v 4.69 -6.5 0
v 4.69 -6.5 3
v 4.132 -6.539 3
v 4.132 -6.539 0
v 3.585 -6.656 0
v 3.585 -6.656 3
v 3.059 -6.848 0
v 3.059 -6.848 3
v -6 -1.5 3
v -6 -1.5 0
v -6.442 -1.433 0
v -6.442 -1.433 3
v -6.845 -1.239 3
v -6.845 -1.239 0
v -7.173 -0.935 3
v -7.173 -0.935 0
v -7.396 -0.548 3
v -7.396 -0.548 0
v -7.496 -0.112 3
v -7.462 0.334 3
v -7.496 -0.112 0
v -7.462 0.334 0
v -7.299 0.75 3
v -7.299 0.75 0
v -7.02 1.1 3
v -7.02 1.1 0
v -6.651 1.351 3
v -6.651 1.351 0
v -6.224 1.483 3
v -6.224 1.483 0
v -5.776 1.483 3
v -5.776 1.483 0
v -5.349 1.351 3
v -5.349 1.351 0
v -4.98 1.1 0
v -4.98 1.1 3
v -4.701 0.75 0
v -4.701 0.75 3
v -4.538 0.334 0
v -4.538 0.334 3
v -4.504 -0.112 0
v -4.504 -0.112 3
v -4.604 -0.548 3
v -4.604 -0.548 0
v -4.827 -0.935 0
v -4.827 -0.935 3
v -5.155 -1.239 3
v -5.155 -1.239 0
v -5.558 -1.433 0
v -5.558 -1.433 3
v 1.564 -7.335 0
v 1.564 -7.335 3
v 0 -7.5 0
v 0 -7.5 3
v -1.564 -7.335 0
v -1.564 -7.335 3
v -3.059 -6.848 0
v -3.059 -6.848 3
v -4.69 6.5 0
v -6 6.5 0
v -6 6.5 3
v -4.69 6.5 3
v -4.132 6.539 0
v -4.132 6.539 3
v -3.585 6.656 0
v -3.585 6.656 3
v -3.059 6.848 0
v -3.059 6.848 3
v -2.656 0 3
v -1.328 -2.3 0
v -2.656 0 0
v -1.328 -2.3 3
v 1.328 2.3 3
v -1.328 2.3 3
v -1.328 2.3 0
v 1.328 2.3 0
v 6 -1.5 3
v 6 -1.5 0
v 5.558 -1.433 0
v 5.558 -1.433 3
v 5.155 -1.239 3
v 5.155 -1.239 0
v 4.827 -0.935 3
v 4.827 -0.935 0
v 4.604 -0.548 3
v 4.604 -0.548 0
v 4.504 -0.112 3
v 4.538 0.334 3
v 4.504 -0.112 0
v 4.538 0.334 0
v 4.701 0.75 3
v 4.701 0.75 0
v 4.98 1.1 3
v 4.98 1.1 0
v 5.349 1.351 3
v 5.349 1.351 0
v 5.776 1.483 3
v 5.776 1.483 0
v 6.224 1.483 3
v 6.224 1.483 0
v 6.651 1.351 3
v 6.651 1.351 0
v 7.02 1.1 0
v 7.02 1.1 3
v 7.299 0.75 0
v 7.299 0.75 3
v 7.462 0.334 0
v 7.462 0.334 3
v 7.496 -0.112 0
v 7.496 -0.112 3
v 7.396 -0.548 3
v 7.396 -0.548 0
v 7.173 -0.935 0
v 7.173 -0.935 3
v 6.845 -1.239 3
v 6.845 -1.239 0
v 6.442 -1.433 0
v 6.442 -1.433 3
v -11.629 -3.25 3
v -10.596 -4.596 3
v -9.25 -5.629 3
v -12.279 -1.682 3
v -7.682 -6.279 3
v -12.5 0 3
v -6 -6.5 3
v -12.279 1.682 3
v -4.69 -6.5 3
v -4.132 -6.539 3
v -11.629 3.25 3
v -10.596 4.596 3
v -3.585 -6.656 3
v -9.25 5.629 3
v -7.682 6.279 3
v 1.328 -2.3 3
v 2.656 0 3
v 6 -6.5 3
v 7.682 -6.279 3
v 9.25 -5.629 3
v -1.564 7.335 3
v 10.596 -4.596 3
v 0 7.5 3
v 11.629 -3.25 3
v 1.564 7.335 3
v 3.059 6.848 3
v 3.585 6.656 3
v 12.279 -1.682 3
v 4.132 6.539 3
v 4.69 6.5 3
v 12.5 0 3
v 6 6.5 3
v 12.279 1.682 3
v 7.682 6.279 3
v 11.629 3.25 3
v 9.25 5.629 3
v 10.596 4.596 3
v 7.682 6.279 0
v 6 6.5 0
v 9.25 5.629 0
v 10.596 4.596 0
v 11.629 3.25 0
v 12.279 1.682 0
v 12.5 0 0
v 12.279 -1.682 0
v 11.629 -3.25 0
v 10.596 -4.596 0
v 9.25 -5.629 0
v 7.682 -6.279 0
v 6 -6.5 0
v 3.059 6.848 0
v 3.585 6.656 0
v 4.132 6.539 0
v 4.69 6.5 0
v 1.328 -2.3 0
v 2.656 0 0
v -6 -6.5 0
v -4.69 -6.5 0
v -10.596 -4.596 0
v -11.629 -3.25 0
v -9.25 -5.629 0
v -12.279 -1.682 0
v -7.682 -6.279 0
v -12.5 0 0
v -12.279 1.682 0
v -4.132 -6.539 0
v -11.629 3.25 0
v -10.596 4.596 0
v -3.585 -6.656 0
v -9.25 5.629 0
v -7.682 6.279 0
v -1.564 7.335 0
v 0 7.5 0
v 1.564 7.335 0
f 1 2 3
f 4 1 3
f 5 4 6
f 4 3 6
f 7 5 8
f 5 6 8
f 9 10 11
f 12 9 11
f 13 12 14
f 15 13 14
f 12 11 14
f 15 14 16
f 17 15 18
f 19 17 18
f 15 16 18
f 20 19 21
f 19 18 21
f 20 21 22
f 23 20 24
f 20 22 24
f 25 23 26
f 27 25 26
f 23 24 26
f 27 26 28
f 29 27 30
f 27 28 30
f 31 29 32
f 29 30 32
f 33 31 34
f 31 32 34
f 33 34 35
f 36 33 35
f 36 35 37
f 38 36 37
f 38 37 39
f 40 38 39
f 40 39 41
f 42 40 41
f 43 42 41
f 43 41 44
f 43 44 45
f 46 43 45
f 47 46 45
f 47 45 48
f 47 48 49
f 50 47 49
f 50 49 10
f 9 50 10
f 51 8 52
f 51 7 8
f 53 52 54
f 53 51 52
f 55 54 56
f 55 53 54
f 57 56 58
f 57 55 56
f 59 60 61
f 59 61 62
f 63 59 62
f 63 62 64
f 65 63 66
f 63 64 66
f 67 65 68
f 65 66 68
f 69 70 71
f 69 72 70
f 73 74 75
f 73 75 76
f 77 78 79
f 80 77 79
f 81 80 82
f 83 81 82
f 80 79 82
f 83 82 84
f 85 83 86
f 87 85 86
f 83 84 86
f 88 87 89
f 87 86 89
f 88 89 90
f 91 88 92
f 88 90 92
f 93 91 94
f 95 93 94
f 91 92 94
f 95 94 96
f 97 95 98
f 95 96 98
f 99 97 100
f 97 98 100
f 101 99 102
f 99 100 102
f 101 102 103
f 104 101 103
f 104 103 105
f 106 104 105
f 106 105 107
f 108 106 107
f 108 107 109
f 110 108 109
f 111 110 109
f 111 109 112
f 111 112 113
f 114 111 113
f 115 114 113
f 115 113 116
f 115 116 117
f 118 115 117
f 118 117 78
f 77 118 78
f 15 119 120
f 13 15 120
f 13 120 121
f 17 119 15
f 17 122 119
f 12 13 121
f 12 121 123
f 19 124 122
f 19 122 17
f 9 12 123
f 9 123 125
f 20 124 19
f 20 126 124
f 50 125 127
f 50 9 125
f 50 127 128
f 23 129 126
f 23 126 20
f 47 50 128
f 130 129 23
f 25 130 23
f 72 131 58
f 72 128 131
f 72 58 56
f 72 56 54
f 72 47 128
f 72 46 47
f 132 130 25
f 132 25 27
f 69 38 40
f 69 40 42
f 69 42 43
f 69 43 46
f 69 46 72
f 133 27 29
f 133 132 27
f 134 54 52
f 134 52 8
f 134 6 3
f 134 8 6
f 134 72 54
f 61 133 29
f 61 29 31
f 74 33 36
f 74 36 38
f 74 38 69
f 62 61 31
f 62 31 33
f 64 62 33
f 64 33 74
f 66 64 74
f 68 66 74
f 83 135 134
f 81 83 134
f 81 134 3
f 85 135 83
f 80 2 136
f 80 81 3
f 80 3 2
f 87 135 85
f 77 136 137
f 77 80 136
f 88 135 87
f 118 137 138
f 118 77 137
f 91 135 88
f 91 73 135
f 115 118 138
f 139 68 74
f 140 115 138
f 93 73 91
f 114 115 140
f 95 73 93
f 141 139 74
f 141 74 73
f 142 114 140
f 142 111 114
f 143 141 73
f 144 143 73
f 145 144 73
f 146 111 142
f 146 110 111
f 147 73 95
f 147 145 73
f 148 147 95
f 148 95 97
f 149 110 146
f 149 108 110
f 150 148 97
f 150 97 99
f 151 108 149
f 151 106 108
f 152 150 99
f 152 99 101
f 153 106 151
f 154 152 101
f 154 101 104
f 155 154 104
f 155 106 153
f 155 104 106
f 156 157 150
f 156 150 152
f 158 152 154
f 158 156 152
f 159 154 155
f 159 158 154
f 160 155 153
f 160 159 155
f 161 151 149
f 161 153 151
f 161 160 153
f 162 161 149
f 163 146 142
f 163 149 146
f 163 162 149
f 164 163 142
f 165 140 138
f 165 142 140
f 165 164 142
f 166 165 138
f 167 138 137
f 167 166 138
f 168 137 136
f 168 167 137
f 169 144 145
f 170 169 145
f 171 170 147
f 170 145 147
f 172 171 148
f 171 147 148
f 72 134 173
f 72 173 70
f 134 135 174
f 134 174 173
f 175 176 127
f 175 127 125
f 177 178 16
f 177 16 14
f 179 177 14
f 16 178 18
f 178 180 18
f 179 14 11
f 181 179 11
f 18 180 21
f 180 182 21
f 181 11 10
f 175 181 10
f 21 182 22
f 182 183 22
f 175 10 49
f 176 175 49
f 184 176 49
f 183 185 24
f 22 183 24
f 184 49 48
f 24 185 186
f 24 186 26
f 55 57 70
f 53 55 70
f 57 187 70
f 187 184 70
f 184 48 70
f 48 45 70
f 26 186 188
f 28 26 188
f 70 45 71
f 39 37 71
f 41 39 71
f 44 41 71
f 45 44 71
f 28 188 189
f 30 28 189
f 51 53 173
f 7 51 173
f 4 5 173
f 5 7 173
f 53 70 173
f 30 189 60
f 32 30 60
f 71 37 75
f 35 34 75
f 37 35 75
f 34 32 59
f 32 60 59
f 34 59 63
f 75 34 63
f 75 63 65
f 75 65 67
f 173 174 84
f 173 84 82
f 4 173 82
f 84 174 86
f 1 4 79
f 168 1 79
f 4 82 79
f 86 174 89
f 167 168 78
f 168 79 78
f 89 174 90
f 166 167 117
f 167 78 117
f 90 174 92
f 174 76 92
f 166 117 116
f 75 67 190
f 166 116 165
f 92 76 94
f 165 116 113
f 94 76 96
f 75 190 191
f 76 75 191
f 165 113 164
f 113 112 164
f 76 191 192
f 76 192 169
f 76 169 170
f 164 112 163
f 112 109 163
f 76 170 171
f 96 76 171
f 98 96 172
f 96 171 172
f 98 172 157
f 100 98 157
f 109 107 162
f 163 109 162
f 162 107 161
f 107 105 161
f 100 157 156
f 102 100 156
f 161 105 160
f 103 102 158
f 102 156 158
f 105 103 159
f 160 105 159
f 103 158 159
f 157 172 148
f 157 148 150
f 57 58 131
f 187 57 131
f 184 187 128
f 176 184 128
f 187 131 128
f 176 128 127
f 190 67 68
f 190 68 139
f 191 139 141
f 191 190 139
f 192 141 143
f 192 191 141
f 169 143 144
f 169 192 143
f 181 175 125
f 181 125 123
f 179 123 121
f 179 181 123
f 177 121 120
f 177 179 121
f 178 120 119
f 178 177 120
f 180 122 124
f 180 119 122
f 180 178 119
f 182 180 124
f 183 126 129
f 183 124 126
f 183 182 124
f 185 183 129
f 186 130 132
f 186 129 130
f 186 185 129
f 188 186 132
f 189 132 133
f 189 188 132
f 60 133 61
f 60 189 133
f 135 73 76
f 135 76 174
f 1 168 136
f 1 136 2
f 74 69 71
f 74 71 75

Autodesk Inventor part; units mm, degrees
ref_plane "YZ Plane" through (0, 0, 0) normal (1, 0, 0) x (0, 1, 0)
ref_plane "XZ Plane" through (0, 0, 0) normal (0, 1, 0) x (-1, 0, 0)
ref_plane "XY Plane" through (0, 0, 0) normal (0, 0, 1) x (1, 0, 0)
sketch "Sketch1" plane through (0, 0, 0) normal (0, 0, 1) x (1, 0, 0)
  circle A0 centre (0, 0) radius 7.5
  arc A1 (6, -6.5) -> (6, 6.5) centre (6, 0) ccw
  line L0 (6, -6.5) -> (-6, -6.5)
  arc A2 (-6, 6.5) -> (-6, -6.5) centre (-6, 0) ccw
  line L1 (-6, 6.5) -> (6, 6.5)
  dimension "d0" = 15
  dimension "d6" = 6
  dimension "d8" = 6
  dimension "d22" = 6.5
  dimension "d23" = 6.5
  dimension "d24" = 12
extrude "Extrusion1" add sketch "Sketch1" along normal blind 3
sketch "草圖4" plane through (0, 0, 3) normal (0, 0, 1) x (1, 0, 0)
  arc A0 (3.7417, 6.5) -> (-3.7417, 6.5) centre (0, 0) ccw projected
  line L0 (1.3279, 2.3) -> (2.6558, 0)
  line L1 (2.6558, 0) -> (1.3279, -2.3)
  line L2 (1.3279, -2.3) -> (-1.3279, -2.3)
  line L3 (-1.3279, -2.3) -> (-2.6558, 0)
  line L4 (-2.6558, 0) -> (-1.3279, 2.3)
  line L5 (-1.3279, 2.3) -> (1.3279, 2.3)
  point P0 (-2.7439, 4.7667)
  point P1 (2.7439, 4.7667)
  point P2 (-6, -4.5)
  point P3 (6, -4.5)
  dimension "d17" = 4.6
extrude "擠出2" cut sketch "草圖4" against normal through all
fillet "圓角2" radius 4 4 edges at (3.7417, -6.5, 1.5) (-3.7417, -6.5, 1.5) (3.7417, 6.5, 1.5) (-3.7417, 6.5, 1.5)
sketch "草圖5" plane through (0, 0, 3) normal (0, 0, 1) x (1, 0, 0)
  arc A0 (6, -6.5) -> (6, 6.5) centre (6, 0) ccw projected
  arc A1 (-6, 6.5) -> (-6, -6.5) centre (-6, 0) ccw projected
hole "孔2" at (-6, 0, 3) at (6, 0, 3) direction (0, 0, -1) diameter 3 end through all
properties part number "plastic_part_99"
